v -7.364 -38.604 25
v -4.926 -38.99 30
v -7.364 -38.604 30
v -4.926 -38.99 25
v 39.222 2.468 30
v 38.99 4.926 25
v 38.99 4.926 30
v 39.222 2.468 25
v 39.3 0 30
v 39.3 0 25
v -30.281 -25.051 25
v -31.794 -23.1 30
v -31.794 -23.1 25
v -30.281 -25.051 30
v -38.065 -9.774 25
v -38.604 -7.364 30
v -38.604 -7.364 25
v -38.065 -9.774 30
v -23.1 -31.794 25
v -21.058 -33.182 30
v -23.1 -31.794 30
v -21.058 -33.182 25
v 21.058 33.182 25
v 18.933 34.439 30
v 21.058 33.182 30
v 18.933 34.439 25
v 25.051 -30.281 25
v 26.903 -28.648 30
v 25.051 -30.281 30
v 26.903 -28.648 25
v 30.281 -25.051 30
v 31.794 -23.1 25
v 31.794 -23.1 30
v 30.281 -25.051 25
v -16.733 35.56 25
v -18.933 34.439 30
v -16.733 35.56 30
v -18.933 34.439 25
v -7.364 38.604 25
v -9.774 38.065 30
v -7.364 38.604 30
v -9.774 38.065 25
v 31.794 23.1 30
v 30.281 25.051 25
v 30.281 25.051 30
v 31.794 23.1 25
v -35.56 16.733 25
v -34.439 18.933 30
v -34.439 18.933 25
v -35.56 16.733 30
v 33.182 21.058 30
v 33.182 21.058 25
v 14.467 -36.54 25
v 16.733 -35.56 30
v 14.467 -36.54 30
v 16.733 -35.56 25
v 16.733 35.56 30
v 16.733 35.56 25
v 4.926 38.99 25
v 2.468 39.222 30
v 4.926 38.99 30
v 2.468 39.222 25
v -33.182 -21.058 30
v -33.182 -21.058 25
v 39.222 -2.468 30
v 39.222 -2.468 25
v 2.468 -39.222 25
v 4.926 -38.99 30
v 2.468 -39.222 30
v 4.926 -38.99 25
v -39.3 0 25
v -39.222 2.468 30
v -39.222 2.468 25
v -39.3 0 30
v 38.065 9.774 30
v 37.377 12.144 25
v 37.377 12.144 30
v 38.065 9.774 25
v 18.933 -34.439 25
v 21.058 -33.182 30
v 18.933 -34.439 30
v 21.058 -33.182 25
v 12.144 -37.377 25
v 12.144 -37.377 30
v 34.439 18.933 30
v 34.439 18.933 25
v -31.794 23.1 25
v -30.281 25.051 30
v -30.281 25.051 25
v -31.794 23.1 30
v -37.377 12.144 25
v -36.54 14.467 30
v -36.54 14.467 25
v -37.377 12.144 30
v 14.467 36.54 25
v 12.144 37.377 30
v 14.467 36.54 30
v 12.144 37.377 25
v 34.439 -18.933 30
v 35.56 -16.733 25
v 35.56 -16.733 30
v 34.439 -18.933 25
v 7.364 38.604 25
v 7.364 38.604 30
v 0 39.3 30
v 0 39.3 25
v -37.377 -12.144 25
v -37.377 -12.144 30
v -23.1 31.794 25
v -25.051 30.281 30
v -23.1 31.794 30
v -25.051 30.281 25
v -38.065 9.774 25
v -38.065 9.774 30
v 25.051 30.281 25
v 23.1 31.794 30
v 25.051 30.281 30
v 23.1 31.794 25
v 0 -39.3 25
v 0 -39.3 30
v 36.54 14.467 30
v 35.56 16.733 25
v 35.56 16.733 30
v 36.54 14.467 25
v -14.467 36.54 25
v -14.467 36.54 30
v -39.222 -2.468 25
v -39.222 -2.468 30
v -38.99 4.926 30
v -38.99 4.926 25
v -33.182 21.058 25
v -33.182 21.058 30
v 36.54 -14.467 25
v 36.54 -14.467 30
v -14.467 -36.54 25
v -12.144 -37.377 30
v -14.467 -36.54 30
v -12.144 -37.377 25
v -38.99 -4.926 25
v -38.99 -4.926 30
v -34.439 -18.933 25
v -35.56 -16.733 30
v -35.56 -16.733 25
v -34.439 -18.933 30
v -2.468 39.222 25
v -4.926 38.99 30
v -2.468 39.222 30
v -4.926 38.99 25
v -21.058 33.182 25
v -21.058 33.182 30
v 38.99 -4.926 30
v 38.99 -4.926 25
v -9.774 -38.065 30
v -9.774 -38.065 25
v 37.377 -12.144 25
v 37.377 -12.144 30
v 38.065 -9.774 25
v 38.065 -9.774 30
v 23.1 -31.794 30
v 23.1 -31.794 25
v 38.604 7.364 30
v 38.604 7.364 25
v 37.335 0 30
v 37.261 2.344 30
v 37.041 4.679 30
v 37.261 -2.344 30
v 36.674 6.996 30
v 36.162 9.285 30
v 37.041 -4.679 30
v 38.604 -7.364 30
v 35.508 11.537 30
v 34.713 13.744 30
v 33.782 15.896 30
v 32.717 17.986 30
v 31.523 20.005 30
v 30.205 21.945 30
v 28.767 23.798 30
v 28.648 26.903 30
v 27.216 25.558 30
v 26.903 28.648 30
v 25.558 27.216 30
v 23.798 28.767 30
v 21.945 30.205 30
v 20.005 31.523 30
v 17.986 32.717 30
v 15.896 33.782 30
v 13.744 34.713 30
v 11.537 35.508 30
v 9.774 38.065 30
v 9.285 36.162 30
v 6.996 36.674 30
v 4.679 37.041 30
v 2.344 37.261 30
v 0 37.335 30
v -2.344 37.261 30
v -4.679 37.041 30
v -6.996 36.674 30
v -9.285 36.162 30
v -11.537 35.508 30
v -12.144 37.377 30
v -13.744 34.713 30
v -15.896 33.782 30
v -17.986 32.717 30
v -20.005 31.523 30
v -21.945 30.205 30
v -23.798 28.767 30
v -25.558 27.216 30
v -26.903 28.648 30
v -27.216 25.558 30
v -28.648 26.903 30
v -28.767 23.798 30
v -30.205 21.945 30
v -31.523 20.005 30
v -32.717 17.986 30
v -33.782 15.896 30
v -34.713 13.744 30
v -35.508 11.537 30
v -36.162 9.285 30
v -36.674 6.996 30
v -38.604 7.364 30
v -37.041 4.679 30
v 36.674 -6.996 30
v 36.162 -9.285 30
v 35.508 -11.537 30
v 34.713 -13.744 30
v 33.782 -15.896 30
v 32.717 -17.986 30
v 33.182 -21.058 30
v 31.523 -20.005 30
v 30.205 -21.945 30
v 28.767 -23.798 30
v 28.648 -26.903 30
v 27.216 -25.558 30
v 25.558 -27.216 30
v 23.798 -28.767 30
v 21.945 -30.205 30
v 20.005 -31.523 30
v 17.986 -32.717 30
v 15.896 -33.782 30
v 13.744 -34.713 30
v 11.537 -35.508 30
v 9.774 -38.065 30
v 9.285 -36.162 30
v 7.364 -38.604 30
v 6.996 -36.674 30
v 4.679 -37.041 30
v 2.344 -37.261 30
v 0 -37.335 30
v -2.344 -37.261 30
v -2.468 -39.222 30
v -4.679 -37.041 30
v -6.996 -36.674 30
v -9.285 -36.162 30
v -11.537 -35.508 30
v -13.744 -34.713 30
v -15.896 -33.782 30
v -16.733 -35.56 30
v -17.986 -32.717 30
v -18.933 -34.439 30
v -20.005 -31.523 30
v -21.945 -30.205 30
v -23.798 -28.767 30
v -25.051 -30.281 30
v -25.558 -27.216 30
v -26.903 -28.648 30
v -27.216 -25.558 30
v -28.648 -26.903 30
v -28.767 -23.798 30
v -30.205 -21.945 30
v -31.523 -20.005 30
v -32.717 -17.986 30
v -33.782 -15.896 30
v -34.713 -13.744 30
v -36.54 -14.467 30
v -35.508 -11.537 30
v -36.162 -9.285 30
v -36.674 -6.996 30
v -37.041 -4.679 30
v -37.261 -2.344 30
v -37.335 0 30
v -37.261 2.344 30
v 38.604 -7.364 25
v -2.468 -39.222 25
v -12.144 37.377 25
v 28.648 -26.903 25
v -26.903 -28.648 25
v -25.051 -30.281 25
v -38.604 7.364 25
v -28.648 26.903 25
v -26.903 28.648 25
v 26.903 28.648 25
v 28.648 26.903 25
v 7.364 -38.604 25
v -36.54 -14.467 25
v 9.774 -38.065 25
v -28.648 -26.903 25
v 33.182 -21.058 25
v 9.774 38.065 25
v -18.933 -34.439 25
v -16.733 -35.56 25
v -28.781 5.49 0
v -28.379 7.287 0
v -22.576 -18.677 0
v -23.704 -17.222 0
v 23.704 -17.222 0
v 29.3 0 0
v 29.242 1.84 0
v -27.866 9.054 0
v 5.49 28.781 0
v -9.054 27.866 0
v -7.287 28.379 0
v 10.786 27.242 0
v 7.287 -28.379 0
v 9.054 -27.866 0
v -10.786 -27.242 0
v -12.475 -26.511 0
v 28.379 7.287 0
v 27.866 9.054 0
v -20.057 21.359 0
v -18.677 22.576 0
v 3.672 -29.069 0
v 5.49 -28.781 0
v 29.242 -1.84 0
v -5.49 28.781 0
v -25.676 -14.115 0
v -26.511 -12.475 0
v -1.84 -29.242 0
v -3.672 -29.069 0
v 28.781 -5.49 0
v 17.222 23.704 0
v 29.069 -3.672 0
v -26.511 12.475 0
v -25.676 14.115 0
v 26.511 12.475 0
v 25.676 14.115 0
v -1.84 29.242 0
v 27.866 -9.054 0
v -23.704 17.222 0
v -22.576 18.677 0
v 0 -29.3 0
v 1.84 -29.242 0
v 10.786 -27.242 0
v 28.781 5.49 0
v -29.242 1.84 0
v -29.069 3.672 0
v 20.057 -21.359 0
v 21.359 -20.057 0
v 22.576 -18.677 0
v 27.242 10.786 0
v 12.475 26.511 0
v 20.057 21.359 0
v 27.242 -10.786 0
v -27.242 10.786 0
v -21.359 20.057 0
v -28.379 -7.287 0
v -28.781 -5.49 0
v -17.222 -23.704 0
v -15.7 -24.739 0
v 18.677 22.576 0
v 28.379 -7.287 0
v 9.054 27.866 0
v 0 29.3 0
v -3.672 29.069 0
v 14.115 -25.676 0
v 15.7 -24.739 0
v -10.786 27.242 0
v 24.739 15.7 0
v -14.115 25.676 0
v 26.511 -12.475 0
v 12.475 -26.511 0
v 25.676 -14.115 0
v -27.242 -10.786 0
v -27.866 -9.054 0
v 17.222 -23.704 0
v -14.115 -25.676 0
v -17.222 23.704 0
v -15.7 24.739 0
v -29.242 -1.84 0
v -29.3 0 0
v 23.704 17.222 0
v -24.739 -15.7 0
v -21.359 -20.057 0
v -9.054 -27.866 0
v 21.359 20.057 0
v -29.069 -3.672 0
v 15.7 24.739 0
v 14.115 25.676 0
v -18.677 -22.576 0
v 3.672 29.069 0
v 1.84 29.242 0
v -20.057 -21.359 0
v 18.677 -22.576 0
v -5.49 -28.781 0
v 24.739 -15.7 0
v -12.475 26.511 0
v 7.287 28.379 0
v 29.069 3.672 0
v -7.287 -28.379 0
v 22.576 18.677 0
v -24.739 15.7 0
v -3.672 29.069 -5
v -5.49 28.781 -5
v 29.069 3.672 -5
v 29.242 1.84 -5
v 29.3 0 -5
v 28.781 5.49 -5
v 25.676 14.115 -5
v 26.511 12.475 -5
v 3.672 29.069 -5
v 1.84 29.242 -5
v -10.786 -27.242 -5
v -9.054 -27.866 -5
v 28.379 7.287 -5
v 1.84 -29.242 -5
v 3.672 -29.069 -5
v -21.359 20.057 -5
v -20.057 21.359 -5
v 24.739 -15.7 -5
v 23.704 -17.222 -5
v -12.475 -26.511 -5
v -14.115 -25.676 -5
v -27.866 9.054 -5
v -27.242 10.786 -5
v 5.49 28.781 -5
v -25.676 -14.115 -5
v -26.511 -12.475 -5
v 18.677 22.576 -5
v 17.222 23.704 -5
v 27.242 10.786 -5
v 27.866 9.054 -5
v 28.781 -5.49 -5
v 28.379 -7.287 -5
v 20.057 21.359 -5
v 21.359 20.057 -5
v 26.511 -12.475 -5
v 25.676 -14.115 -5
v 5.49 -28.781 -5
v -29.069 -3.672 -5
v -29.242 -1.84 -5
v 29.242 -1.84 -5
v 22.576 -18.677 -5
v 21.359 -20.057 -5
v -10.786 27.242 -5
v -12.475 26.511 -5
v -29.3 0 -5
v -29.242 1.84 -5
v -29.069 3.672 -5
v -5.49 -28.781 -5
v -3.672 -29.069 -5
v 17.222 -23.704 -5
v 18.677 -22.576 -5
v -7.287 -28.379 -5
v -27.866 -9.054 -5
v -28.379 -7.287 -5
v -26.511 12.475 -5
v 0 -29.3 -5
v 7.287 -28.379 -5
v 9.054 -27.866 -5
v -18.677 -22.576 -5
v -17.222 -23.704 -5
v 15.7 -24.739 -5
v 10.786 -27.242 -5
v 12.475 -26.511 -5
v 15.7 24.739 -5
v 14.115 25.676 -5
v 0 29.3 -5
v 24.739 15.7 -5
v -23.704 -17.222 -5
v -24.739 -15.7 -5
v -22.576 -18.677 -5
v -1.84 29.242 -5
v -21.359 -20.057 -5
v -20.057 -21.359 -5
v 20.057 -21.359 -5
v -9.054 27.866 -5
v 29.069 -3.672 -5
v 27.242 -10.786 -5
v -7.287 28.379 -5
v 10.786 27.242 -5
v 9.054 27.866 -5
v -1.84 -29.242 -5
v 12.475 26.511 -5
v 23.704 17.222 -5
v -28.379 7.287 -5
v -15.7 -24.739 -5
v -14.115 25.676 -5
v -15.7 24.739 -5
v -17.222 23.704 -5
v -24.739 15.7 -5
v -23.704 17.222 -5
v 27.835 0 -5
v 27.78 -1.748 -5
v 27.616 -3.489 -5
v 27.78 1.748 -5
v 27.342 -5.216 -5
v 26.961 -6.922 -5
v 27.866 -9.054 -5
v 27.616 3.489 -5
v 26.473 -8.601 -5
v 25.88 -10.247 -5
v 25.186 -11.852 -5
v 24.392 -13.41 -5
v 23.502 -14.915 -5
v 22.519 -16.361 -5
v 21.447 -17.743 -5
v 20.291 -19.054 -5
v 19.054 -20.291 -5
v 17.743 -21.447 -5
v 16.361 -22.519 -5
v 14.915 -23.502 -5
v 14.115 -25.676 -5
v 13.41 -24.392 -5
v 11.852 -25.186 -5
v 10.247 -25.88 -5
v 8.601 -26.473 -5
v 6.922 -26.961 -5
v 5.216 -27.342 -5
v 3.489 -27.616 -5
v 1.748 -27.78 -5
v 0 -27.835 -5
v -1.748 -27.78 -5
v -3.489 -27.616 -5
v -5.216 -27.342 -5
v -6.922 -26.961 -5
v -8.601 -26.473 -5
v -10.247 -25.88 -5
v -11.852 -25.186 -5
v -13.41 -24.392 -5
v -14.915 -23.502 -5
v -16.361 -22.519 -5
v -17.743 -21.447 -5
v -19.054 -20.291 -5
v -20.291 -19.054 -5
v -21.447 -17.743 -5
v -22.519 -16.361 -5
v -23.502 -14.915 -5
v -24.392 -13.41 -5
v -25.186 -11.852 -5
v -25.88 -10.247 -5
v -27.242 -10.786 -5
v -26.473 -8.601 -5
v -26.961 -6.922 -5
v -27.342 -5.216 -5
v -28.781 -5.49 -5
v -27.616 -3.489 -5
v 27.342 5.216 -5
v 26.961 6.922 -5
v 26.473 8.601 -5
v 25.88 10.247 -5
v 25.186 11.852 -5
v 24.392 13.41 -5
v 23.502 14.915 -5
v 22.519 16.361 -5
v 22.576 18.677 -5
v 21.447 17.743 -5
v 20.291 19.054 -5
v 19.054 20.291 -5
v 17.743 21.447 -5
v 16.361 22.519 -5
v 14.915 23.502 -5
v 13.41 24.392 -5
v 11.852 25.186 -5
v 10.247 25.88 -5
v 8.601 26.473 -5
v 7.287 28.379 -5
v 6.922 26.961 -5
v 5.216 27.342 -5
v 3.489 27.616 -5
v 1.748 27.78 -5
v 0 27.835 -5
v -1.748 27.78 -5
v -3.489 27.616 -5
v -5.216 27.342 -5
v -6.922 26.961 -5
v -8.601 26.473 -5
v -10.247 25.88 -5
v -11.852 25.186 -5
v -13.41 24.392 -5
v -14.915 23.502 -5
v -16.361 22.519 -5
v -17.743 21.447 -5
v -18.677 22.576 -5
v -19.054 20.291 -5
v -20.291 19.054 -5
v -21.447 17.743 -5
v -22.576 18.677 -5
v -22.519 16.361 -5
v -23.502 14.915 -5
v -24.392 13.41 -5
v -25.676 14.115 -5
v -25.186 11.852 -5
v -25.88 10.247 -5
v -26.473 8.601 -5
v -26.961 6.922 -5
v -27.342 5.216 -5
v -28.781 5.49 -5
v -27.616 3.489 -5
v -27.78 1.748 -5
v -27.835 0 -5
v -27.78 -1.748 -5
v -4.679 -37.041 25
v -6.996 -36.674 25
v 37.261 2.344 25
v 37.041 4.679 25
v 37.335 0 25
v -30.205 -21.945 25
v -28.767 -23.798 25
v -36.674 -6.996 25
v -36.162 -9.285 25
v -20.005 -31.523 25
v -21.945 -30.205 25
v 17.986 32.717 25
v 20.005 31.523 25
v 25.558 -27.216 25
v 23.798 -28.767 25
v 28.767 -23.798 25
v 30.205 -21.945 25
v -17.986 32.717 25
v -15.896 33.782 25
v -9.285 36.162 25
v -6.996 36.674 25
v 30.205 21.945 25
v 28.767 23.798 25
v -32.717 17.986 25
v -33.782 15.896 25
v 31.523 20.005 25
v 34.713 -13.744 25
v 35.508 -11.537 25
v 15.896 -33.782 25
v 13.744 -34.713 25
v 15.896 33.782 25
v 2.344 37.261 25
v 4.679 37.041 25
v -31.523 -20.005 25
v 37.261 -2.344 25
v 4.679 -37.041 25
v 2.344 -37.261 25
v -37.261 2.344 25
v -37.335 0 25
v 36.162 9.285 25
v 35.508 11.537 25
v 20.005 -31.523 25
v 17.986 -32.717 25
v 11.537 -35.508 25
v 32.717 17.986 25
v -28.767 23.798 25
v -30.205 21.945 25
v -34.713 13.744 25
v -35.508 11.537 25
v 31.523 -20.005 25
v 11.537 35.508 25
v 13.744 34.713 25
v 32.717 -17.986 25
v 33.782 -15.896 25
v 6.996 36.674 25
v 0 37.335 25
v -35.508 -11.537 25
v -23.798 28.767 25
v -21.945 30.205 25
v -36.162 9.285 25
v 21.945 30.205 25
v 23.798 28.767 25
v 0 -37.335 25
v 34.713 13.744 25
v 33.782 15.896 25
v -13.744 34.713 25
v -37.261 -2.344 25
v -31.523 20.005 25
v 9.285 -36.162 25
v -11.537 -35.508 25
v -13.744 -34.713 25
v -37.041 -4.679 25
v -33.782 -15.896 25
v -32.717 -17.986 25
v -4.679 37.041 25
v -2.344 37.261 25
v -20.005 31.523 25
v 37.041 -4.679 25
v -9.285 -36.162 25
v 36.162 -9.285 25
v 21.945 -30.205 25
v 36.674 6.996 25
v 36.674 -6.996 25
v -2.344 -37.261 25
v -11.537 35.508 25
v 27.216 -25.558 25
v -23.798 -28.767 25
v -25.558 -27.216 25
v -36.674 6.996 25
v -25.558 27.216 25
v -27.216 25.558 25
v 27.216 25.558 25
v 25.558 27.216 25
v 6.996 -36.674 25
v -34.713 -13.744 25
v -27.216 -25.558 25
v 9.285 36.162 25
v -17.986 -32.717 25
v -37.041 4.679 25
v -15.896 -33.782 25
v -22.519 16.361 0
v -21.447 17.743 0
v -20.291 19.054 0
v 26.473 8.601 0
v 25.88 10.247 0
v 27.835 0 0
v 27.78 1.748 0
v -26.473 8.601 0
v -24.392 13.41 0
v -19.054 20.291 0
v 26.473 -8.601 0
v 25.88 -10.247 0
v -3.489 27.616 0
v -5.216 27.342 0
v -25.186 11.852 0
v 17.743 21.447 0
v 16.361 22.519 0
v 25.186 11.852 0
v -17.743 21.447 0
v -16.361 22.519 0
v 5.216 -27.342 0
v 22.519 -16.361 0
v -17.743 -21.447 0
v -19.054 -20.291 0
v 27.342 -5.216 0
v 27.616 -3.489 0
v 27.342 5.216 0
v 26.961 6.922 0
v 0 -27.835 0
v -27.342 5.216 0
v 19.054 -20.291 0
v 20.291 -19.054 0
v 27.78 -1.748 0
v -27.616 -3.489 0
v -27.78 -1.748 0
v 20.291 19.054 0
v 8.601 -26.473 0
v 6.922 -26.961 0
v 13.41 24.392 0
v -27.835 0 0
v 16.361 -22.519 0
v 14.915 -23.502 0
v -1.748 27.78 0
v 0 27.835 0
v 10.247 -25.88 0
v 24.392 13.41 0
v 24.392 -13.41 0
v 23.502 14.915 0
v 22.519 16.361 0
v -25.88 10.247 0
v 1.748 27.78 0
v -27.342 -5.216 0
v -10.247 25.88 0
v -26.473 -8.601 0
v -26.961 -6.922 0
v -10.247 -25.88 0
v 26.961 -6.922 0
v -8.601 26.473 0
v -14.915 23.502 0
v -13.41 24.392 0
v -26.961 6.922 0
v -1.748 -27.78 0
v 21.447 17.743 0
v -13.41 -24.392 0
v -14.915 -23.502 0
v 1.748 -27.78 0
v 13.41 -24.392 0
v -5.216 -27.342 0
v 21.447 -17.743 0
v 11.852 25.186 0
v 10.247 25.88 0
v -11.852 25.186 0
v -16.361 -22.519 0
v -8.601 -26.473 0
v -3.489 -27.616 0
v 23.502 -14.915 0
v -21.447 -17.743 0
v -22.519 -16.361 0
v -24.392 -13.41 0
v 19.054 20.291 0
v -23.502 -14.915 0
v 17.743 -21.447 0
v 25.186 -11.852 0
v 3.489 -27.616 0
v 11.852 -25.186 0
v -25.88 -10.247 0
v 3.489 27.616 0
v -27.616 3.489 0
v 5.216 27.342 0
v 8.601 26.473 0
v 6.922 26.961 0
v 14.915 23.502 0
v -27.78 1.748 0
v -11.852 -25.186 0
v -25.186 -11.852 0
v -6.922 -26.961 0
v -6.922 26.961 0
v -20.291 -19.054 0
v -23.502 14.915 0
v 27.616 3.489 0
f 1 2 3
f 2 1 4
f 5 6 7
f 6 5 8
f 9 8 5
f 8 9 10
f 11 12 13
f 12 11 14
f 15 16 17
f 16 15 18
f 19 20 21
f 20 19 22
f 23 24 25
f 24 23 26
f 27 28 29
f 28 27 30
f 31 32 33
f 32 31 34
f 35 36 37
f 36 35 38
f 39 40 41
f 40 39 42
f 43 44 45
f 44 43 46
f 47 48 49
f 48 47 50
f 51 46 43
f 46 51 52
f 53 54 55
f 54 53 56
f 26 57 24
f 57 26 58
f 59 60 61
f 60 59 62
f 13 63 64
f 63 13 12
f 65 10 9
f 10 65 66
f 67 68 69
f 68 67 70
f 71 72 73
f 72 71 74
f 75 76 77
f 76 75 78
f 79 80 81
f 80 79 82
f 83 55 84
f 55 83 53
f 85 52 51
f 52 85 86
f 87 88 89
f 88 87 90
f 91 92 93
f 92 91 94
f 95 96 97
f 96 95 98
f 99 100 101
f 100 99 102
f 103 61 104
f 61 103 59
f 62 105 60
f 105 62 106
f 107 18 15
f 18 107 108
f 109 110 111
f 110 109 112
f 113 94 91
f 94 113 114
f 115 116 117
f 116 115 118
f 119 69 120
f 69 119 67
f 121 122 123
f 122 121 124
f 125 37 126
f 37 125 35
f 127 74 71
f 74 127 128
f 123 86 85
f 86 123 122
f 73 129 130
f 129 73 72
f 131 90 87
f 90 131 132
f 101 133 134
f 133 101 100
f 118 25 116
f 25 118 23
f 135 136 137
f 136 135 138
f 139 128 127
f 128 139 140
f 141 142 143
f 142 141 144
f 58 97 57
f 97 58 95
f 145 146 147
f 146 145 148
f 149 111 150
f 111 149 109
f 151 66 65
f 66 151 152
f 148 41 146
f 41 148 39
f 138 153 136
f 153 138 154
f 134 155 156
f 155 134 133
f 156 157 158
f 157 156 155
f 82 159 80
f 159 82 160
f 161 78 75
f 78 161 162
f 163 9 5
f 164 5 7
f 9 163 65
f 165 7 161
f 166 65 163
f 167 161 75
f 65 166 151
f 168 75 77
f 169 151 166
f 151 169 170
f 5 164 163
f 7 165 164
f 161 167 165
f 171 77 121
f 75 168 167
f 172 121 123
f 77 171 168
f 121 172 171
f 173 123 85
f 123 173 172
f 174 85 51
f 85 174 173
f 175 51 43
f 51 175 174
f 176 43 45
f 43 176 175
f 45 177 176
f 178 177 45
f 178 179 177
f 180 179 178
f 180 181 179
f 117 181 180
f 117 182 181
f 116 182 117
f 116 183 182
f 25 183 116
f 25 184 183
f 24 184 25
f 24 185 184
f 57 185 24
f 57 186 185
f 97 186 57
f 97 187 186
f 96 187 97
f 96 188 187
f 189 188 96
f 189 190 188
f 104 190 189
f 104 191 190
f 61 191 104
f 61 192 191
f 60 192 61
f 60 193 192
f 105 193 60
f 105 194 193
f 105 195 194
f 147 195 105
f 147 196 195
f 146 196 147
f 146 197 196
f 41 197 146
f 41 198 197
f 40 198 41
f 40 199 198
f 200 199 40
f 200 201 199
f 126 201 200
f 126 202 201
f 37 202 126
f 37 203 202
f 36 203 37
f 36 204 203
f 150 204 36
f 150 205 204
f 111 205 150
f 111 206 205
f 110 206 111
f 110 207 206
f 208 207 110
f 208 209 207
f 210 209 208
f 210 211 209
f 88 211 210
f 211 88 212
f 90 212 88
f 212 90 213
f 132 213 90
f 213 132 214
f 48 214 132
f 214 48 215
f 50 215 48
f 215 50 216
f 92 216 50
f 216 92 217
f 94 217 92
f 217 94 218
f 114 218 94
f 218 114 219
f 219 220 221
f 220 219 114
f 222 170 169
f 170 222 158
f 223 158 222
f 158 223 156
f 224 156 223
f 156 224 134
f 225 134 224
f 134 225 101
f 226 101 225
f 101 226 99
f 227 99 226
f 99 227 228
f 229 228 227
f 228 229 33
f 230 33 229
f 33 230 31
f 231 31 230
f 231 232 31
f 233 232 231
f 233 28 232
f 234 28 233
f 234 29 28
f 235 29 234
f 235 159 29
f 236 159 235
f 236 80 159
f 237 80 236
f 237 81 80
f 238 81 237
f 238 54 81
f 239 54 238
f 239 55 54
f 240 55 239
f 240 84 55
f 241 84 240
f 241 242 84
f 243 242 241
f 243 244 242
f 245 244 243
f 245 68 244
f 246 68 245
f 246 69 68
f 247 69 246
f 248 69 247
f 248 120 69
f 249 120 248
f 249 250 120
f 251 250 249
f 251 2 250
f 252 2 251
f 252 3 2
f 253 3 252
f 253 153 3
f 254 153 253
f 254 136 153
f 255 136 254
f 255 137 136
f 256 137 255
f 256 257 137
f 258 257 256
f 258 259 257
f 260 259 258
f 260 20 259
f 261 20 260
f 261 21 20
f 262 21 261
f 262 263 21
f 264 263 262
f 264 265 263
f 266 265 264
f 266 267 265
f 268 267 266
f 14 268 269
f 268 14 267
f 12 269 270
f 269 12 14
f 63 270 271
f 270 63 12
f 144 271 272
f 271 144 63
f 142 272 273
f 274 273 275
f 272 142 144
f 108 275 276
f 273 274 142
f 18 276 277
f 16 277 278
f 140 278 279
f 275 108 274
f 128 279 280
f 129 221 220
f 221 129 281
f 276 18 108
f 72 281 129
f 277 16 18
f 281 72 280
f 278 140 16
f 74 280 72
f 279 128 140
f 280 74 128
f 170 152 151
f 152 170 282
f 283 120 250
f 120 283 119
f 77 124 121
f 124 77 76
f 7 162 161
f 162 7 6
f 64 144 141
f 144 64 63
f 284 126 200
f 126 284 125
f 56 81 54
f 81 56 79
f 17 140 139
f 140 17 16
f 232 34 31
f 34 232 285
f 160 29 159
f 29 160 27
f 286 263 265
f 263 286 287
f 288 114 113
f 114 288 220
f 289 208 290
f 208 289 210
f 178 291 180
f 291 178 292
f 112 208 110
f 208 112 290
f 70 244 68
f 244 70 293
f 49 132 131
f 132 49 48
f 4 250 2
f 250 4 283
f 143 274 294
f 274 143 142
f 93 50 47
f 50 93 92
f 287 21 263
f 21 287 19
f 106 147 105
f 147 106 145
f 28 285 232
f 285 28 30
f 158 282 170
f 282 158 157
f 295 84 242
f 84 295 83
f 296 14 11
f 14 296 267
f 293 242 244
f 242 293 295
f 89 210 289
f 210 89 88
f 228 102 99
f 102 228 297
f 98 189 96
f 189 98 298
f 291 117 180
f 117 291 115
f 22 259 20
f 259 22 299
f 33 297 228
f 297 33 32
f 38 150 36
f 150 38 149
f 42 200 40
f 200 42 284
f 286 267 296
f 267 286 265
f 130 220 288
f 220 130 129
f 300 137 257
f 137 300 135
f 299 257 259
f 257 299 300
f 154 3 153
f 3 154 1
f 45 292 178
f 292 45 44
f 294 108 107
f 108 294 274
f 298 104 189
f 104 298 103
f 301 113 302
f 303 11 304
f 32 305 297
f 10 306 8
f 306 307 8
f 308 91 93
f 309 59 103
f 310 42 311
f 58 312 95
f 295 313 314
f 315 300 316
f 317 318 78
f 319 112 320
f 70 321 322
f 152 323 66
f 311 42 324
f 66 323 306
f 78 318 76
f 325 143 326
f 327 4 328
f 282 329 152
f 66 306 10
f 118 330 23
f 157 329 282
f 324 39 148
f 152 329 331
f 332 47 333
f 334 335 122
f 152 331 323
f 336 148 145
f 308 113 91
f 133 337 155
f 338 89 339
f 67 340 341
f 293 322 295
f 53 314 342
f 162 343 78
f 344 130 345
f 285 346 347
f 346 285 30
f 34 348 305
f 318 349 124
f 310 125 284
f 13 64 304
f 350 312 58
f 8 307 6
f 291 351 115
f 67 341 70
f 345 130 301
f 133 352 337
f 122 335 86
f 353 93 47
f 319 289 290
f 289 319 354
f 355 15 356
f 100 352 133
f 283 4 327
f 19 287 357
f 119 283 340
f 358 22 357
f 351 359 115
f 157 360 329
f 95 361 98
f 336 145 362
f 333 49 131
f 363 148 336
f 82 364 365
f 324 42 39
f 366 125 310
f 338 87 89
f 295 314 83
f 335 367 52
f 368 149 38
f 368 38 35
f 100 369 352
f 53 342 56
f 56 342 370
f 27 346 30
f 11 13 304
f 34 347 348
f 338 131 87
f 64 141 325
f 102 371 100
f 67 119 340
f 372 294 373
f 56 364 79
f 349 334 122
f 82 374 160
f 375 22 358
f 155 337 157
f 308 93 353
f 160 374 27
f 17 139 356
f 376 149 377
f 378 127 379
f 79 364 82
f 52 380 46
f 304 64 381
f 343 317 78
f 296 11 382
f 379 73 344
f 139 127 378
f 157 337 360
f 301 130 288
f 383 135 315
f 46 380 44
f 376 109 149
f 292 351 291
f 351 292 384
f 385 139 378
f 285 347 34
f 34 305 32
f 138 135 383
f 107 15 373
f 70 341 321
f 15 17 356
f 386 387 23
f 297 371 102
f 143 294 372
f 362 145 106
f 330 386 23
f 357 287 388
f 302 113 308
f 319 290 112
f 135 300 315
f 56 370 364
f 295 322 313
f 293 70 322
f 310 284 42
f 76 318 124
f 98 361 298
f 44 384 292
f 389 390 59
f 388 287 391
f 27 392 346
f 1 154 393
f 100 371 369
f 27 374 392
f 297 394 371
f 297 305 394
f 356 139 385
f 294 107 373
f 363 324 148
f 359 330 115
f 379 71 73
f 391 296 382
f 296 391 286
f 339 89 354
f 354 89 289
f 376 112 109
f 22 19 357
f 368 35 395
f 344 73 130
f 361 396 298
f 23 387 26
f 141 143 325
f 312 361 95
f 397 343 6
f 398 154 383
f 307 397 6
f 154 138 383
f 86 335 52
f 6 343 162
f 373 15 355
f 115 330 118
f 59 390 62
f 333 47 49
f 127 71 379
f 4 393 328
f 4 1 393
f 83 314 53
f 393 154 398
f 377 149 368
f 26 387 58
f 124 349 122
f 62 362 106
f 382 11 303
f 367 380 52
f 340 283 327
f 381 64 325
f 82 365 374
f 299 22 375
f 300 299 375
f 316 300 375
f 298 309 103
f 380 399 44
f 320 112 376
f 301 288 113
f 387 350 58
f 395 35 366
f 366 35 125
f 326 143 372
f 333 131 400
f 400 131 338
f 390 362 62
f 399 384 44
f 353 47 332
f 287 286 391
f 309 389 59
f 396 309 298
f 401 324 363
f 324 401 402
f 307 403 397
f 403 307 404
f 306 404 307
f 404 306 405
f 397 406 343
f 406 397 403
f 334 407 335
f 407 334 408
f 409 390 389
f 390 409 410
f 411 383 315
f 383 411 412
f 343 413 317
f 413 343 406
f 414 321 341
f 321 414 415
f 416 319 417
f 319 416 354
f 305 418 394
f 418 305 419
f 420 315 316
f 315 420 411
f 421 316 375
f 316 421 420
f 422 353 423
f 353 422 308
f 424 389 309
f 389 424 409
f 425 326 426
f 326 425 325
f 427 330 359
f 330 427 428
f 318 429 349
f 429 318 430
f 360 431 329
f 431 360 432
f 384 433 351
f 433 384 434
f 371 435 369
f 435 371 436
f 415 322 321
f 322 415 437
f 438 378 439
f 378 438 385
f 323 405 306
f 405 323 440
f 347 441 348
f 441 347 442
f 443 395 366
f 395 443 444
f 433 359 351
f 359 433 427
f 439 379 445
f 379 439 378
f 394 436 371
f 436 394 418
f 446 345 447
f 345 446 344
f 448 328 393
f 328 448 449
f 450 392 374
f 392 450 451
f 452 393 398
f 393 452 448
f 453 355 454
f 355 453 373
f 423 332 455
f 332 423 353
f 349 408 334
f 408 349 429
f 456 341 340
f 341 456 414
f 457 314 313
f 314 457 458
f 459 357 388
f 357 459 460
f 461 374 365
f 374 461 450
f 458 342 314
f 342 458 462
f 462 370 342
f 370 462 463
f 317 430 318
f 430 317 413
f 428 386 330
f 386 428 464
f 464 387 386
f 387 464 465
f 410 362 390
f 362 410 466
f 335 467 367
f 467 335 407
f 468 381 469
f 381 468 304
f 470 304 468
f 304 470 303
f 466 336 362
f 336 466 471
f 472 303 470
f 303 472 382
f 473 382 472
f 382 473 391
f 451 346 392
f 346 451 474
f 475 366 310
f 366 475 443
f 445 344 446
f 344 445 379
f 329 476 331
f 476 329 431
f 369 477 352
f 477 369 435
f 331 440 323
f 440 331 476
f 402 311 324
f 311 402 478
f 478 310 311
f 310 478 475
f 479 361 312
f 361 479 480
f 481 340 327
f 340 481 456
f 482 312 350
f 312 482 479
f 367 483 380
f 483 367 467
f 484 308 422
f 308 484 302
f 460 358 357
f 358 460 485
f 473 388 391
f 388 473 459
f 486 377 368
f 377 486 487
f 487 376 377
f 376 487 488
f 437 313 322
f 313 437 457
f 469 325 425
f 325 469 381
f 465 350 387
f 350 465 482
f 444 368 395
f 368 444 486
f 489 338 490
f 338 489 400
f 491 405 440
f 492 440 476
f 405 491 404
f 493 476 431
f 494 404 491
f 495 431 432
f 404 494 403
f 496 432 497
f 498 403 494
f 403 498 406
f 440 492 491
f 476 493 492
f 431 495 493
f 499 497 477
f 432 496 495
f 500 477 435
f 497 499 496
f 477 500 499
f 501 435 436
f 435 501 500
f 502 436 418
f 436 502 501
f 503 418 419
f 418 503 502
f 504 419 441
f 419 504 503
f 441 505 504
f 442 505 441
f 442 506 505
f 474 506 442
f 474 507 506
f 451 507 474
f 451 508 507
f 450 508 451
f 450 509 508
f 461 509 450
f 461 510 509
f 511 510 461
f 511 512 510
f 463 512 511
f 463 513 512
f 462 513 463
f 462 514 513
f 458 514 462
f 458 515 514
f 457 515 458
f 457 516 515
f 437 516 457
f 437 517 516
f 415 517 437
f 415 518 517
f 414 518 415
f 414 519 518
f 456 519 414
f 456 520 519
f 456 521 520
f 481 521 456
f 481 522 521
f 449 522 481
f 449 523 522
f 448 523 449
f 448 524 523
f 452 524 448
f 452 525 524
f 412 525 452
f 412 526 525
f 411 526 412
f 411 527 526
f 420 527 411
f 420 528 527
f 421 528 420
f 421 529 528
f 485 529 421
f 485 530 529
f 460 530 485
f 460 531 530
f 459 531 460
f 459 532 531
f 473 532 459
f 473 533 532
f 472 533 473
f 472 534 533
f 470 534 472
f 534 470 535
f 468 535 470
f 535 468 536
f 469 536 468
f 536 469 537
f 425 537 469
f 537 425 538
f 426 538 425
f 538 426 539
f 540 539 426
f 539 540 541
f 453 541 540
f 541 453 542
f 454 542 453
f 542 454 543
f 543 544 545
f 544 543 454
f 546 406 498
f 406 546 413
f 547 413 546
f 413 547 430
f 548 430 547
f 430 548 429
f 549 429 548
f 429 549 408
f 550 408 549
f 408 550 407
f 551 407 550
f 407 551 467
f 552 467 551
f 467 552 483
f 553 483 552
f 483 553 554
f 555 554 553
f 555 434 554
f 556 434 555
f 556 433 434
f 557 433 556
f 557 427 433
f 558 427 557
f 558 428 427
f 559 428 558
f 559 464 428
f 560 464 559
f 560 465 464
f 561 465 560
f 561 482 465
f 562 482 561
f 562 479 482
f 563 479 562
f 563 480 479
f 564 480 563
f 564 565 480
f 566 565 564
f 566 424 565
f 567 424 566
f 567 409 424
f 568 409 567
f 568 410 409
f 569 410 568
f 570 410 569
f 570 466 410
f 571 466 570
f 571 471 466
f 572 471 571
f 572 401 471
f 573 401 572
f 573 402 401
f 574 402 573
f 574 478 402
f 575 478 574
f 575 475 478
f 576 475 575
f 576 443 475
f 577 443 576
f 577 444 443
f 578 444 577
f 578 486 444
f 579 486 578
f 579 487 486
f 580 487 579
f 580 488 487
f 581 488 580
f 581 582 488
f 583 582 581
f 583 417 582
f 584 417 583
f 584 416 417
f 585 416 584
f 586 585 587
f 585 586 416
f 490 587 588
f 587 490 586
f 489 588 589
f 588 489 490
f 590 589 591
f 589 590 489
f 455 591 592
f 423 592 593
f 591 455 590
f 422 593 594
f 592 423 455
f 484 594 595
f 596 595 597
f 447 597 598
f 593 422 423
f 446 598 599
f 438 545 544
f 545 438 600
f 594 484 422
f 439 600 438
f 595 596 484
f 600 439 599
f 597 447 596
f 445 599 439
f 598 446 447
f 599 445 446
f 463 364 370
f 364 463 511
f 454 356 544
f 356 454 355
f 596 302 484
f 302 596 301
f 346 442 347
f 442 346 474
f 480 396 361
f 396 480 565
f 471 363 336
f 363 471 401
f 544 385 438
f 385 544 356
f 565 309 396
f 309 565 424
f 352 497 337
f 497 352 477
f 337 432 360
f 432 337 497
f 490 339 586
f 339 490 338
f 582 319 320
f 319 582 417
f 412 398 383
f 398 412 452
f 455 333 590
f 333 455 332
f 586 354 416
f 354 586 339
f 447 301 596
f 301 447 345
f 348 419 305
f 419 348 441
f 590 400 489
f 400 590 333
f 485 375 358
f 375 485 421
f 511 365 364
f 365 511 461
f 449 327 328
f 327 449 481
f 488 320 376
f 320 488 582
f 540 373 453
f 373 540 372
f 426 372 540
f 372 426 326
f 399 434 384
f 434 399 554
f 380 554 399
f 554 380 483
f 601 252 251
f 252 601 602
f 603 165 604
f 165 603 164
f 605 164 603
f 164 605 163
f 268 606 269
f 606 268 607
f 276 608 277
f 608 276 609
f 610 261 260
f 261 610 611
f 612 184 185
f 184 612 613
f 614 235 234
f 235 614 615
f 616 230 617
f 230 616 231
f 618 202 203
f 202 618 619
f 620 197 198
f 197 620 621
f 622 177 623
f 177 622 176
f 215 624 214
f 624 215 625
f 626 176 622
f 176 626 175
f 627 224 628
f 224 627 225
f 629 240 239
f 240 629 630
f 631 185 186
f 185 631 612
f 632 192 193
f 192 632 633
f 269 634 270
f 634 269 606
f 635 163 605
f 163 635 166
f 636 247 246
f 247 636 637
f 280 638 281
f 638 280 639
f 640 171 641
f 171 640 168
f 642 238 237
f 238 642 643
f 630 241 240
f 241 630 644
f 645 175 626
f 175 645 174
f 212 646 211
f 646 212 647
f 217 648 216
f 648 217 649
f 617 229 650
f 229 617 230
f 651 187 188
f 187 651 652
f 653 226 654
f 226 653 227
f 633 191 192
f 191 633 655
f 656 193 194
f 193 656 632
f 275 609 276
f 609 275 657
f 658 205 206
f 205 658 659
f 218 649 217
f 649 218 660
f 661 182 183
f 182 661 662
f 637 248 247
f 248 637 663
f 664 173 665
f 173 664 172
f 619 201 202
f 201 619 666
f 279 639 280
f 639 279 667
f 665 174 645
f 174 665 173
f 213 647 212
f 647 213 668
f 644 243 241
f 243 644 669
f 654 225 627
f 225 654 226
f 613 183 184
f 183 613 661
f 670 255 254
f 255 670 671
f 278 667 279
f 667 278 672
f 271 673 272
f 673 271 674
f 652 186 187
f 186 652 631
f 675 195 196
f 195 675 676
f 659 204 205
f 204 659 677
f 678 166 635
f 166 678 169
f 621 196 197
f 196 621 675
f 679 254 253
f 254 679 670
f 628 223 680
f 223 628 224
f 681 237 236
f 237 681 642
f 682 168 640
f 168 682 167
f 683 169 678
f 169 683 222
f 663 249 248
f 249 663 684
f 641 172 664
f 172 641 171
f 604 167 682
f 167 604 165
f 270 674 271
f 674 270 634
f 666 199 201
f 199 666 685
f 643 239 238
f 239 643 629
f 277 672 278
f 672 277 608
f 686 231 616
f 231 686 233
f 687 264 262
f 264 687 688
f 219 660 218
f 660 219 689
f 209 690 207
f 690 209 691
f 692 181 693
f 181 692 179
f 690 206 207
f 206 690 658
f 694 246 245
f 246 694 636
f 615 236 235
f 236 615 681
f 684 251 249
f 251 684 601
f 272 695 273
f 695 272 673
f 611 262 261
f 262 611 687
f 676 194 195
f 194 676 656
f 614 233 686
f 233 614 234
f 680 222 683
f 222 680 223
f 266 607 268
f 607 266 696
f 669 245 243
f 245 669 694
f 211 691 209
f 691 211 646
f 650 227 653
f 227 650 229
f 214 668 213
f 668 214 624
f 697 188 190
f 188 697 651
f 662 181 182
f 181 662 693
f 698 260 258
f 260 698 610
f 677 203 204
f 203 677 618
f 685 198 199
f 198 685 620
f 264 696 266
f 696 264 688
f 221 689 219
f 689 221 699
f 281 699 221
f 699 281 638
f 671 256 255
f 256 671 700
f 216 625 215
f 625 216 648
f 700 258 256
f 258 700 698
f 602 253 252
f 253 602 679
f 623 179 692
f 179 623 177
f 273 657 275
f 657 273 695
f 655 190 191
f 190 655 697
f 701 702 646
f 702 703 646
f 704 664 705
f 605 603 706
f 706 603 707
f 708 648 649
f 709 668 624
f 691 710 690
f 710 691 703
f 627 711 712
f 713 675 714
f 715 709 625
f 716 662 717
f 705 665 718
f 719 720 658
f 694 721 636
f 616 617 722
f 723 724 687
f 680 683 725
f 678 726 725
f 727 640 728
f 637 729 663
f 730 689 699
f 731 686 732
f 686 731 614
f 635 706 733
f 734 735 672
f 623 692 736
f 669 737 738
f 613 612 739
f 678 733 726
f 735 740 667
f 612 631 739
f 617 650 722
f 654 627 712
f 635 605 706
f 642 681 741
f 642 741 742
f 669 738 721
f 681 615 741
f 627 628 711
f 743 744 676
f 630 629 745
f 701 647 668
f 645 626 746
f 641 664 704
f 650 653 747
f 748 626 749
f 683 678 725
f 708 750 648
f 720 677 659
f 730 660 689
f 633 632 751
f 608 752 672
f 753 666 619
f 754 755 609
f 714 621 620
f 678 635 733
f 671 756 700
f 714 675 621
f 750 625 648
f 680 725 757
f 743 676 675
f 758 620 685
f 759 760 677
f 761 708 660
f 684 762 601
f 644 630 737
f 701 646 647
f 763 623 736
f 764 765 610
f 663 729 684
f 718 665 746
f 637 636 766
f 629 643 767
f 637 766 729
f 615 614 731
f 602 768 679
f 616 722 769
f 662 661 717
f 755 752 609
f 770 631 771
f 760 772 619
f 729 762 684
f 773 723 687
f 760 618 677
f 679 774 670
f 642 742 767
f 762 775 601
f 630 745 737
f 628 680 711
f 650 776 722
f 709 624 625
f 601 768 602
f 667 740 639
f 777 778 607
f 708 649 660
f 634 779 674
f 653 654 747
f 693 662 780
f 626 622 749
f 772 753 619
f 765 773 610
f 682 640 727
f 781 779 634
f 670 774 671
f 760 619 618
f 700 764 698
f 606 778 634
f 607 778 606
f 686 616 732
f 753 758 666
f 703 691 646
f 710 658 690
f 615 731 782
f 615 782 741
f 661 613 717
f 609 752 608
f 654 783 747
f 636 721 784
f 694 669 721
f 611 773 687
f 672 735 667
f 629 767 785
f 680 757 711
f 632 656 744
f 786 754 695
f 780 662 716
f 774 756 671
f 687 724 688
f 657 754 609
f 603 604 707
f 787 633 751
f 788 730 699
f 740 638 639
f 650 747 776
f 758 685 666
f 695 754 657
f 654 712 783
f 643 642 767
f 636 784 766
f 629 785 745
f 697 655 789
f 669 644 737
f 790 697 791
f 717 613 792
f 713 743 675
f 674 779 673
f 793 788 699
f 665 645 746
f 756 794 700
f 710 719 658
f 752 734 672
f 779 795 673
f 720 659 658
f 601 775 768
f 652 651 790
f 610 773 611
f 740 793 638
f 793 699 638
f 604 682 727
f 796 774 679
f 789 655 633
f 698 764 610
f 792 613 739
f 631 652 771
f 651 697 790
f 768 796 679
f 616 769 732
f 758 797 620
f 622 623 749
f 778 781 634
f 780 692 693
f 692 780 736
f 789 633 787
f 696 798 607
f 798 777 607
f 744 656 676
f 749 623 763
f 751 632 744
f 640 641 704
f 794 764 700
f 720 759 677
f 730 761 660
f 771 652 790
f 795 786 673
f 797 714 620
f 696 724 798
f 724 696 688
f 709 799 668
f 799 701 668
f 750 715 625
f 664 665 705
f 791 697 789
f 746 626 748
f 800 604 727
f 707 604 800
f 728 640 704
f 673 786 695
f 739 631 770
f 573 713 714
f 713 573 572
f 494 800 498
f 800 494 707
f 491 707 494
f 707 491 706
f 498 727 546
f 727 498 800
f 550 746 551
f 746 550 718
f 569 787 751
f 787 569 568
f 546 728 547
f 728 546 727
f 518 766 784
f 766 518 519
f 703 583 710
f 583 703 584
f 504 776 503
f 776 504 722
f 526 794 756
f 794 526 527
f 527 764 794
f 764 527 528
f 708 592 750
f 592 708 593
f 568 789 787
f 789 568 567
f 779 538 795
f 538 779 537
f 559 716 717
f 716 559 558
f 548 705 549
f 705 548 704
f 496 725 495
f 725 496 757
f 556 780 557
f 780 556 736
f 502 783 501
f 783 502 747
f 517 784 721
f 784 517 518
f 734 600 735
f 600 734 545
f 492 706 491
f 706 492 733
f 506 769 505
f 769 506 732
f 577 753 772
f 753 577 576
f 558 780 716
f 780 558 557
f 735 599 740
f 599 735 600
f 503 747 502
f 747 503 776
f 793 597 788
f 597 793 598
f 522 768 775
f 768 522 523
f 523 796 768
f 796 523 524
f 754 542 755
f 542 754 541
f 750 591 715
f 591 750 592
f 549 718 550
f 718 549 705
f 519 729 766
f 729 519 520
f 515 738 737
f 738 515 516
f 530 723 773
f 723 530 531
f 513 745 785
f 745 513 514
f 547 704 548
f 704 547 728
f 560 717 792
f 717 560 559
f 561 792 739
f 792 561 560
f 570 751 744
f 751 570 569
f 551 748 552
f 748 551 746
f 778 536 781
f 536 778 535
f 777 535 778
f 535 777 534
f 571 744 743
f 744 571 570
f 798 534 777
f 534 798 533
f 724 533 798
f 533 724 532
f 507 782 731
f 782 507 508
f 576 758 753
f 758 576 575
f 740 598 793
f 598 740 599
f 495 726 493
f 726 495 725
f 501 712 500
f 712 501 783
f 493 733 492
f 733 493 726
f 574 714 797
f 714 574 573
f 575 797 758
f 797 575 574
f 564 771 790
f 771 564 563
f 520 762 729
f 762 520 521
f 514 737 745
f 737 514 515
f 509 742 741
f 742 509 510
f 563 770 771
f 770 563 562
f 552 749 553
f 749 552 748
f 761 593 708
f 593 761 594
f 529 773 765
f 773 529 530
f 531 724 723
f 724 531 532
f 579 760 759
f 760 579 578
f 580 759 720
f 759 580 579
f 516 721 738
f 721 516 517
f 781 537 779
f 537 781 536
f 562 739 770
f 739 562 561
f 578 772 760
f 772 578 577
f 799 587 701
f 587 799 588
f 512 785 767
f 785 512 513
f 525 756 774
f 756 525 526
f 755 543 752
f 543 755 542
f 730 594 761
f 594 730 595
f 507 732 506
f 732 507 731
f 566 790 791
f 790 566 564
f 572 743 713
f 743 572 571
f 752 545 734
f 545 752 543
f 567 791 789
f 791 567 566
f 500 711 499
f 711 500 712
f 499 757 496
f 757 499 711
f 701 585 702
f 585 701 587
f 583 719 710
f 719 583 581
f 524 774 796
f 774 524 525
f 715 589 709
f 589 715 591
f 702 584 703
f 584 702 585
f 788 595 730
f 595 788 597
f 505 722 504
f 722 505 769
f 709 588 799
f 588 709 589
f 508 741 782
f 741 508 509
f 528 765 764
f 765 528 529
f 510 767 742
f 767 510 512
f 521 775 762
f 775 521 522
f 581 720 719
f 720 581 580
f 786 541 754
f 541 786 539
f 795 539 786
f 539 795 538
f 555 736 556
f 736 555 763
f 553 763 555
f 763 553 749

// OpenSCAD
R = 58.6/2;


$fn=100;

module foo() {
 translate([0,0,25]) cylinder(h=5, r=R+10);

 cylinder(h=25, r1=R, r2=R+10);
 
   translate([0,0,-5]) cylinder(h=5, r=R);  
}




difference(){
foo();
scale([0.95,0.95,1]) foo();
}
